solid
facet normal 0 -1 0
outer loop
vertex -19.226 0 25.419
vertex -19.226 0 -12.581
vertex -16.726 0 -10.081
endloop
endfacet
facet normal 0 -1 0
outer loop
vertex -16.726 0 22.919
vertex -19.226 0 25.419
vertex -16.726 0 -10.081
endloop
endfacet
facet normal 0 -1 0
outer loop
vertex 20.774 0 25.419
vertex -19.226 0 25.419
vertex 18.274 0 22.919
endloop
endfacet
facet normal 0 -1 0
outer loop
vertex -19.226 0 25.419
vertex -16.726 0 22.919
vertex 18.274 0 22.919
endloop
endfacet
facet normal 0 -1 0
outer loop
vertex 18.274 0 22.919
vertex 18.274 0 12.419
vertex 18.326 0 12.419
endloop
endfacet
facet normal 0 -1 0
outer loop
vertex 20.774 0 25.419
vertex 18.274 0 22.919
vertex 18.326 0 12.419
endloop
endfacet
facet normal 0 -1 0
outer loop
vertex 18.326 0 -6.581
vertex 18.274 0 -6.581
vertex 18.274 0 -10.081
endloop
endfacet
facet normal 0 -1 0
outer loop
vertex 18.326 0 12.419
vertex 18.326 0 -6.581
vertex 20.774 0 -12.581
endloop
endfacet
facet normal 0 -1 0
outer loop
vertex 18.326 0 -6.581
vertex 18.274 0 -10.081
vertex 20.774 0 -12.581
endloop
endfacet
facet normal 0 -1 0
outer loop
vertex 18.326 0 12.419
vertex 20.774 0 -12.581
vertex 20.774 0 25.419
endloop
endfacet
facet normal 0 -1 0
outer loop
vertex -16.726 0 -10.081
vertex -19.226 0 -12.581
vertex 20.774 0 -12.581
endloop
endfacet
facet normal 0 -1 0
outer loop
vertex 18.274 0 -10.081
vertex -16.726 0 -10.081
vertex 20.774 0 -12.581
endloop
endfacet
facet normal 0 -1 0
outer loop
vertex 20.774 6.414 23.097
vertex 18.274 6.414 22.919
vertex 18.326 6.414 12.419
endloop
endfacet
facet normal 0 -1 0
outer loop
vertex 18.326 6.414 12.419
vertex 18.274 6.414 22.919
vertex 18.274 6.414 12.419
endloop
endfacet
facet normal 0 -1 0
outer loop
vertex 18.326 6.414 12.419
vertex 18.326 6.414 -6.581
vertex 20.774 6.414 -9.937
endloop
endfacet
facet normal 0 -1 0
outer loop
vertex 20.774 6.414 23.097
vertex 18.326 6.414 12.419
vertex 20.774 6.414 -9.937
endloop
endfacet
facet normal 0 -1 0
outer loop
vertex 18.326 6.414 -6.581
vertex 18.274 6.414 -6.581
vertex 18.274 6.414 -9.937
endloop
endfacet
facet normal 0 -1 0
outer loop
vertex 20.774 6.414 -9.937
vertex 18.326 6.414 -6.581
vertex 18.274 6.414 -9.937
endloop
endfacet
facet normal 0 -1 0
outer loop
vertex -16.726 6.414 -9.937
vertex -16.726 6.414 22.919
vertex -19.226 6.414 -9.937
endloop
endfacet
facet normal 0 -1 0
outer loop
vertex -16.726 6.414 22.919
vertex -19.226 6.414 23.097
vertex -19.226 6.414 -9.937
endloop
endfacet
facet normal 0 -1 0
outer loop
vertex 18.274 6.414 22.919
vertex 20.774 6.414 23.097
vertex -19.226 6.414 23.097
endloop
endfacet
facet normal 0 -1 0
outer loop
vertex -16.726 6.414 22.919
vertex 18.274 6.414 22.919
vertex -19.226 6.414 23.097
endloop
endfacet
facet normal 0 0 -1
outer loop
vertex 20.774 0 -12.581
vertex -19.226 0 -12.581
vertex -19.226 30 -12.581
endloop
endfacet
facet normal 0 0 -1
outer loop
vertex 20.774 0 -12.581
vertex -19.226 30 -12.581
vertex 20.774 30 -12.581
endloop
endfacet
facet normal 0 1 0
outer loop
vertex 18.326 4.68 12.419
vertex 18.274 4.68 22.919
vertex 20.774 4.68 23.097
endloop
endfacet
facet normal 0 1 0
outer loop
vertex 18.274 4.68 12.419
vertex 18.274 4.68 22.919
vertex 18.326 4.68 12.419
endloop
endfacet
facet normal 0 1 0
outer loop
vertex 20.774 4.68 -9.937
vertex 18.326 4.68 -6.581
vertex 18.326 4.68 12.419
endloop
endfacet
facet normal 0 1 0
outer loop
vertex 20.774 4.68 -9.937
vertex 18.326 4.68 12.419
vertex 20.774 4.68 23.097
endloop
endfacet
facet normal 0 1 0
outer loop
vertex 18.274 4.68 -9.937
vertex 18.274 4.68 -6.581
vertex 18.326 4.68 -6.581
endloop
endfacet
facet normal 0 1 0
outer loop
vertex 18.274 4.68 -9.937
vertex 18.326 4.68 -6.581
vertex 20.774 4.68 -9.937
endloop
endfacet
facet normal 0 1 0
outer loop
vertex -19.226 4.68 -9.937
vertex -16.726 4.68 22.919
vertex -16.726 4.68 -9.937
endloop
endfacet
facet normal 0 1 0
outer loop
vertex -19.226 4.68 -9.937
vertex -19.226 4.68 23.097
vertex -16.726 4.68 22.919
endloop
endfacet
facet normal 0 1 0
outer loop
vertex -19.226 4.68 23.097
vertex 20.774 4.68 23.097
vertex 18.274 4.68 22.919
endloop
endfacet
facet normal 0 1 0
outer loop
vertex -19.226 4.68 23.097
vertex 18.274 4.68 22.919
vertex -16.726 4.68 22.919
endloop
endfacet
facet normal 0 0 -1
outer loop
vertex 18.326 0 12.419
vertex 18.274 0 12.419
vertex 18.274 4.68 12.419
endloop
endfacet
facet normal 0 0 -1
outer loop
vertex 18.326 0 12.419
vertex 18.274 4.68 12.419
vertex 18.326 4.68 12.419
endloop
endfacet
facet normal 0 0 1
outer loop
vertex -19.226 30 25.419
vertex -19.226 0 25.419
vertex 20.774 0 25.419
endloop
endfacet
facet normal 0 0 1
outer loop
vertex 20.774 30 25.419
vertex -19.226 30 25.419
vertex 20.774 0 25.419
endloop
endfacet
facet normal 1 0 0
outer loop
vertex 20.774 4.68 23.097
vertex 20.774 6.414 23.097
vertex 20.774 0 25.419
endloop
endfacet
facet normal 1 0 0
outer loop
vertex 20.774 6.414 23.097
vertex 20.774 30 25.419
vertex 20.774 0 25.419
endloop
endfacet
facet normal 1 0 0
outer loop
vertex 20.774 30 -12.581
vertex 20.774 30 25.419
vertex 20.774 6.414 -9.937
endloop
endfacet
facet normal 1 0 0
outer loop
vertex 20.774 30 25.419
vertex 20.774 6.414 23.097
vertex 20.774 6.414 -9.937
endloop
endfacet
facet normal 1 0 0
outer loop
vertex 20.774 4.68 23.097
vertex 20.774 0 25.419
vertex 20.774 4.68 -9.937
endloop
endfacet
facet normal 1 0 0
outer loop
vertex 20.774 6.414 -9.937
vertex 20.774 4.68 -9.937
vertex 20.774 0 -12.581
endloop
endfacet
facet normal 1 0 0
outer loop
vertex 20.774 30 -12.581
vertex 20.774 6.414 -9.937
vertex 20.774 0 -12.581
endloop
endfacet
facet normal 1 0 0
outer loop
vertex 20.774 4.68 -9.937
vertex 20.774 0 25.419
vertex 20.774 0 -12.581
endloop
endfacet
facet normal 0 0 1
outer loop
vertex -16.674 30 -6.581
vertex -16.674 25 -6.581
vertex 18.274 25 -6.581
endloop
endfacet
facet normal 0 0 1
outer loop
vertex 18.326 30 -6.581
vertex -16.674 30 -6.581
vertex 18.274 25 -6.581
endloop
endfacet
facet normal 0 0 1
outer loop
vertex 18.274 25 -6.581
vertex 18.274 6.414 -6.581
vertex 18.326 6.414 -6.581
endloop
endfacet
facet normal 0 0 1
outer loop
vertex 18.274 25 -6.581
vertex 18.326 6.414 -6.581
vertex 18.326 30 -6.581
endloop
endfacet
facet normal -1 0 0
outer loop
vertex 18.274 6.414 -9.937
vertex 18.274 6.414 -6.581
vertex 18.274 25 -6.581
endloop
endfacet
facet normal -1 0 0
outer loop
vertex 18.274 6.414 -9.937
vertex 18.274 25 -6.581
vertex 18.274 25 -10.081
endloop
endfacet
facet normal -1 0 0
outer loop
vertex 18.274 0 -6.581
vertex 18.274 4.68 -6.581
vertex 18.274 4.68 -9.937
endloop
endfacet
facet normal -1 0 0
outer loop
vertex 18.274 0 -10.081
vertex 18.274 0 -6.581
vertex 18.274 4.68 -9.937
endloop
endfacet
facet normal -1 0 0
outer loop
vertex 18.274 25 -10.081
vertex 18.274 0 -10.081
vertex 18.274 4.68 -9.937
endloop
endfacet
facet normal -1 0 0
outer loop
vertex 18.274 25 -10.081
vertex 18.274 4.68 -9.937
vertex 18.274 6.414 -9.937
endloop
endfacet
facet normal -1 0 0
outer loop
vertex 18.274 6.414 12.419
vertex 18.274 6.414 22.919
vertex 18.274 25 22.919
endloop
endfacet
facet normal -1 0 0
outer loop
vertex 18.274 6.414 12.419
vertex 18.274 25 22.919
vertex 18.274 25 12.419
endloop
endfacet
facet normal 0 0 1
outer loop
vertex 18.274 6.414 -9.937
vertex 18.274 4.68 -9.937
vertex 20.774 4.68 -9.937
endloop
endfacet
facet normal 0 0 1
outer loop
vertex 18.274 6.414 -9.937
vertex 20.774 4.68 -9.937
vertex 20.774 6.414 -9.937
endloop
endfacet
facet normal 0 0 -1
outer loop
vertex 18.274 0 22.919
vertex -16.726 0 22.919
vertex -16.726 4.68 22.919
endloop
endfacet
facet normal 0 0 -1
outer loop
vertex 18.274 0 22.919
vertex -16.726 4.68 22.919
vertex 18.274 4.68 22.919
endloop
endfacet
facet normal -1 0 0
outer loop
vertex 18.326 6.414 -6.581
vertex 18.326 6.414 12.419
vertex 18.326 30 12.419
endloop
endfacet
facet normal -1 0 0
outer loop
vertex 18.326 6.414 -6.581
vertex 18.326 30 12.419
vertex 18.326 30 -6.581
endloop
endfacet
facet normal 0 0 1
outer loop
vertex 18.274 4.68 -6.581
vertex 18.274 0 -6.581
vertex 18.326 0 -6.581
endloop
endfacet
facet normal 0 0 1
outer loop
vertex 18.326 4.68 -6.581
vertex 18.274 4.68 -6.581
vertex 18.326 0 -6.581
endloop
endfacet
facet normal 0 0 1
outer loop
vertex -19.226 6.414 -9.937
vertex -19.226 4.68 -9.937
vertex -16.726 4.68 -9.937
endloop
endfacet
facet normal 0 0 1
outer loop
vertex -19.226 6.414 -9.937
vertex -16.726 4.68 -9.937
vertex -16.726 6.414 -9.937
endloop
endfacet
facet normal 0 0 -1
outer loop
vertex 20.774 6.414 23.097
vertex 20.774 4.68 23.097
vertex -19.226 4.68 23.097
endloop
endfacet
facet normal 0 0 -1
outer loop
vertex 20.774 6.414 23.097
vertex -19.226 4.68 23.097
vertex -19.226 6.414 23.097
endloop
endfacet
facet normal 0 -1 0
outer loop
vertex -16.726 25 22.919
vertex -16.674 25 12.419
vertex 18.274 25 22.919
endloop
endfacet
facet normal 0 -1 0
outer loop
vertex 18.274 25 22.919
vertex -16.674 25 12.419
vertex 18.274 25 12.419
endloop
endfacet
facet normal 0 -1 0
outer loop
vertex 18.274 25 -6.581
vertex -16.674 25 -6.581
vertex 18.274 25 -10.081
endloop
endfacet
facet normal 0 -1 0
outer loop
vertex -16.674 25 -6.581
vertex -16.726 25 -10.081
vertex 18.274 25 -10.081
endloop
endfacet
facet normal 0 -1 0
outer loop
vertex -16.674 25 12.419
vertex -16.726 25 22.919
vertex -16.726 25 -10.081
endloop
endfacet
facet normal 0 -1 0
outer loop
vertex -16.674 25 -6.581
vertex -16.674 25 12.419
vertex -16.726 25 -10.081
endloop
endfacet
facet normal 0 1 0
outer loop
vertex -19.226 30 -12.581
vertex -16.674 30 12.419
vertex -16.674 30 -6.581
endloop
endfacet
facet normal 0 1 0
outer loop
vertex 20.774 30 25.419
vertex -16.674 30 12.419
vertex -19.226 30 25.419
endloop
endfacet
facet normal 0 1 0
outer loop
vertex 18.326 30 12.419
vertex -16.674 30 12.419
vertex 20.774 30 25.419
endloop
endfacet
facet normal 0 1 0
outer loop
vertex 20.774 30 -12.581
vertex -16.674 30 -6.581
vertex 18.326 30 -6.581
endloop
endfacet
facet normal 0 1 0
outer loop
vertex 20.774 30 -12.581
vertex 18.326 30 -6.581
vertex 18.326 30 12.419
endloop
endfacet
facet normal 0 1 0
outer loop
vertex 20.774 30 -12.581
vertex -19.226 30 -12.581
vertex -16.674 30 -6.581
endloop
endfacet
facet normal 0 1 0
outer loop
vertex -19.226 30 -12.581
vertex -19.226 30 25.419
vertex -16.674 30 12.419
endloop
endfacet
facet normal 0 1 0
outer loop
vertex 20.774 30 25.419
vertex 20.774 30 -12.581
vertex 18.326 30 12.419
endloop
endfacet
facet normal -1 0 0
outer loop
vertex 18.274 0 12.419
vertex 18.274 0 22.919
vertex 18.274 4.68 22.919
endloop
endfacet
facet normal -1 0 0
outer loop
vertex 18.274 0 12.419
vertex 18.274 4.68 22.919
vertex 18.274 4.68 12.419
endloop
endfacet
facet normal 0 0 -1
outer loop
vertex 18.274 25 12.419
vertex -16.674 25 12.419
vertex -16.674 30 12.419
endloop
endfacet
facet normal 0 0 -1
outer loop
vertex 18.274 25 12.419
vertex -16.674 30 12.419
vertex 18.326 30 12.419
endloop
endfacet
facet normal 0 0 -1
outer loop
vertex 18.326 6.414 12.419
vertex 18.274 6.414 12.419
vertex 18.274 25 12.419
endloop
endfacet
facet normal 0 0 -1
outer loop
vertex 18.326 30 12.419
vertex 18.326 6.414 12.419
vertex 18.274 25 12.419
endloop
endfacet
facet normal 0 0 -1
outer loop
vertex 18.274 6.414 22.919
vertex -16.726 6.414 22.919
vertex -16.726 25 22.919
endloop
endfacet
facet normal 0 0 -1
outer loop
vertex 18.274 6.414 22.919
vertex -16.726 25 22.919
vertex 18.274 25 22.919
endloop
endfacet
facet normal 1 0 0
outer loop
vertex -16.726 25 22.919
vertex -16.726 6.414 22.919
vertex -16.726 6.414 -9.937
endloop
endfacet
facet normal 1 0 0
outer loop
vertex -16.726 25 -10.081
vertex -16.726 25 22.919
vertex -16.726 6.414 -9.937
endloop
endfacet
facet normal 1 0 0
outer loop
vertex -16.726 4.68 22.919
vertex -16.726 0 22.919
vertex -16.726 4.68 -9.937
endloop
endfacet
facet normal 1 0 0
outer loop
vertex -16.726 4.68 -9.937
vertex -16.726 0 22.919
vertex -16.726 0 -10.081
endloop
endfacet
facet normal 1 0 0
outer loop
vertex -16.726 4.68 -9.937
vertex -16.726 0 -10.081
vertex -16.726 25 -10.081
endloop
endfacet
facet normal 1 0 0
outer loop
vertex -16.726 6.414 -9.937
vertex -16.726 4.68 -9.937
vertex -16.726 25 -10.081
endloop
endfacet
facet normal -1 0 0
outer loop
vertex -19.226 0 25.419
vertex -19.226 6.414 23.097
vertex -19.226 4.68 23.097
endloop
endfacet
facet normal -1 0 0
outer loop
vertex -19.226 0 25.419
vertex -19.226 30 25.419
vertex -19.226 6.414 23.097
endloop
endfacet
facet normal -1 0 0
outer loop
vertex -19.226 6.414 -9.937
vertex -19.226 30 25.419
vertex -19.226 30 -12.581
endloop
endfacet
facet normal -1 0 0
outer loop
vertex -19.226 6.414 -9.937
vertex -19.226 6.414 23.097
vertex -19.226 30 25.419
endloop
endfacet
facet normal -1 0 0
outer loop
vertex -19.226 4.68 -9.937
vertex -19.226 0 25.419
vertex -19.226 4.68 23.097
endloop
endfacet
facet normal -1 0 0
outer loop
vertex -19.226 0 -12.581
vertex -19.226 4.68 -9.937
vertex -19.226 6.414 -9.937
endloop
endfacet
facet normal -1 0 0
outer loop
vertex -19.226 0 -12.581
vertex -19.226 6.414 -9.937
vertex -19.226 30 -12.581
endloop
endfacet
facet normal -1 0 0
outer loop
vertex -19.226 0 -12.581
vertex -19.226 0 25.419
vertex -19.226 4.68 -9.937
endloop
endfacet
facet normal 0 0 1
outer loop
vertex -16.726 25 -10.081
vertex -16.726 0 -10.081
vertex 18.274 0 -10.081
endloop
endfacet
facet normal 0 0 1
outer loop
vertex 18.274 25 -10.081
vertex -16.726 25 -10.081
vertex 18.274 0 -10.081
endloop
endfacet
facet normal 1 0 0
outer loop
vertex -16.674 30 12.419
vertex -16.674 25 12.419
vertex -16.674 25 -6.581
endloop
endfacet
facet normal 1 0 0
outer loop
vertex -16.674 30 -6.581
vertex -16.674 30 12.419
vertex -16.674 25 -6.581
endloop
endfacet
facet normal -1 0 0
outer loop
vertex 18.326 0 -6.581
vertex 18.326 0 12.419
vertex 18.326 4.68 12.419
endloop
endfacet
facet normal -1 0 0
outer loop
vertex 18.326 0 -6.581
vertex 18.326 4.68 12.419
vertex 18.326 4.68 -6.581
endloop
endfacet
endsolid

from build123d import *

# Parameters (mm, degrees)
SKETCH1_W           = 40
SKETCH1_H           = 38
BOSS_EXTRUDE2_DEPTH = 30
SKETCH3_W           = 35
SKETCH3_H           = 33
CUT_EXTRUDE1_DEPTH  = 25
SKETCH4_W           = 35
SKETCH4_H           = 19
CUT_EXTRUDE3_DEPTH  = 30
CUT_EXTRUDE4_START  = -79.225806
SKETCH5_W           = 33.033354951
SKETCH5_H           = 1.733302189
CUT_EXTRUDE4_DEPTH  = 100


with BuildPart() as part:
    # Sketch1 → Boss-Extrude2 (new body)
    with BuildSketch(Plane(origin=(0, 0, 0), x_dir=(1, 0, 0), z_dir=(0, 1, 0))):
        with Locations((0.774193548, -6.419354839)):
            Rectangle(SKETCH1_W, SKETCH1_H)
    extrude(amount=BOSS_EXTRUDE2_DEPTH)

    # Sketch3 → Cut-Extrude1 (cut)
    with BuildSketch(Plane(origin=(0, 0, 0), x_dir=(1, 0, 0), z_dir=(0, 1, 0))):
        with Locations((0.774193548, -6.419354839)):
            Rectangle(SKETCH3_W, SKETCH3_H)
    extrude(amount=CUT_EXTRUDE1_DEPTH, mode=Mode.SUBTRACT)

    # Sketch4 → Cut-Extrude3 (cut)
    with BuildSketch(Plane(origin=(0, 0, 0), x_dir=(1, 0, 0), z_dir=(0, 1, 0))):
        with Locations((0.826342552, -2.919354839)):
            Rectangle(SKETCH4_W, SKETCH4_H)
    extrude(amount=CUT_EXTRUDE3_DEPTH, mode=Mode.SUBTRACT)

    # Sketch5 → Cut-Extrude4 (cut)
    with BuildSketch(Plane(origin=(0, 0, 0), x_dir=(0, 0, -1), z_dir=(1, 0, 0)).offset(CUT_EXTRUDE4_START)):
        with Locations((-6.580047935, 5.546955331)):
            Rectangle(SKETCH5_W, SKETCH5_H)
    extrude(amount=CUT_EXTRUDE4_DEPTH, mode=Mode.SUBTRACT)


solid = part.part
